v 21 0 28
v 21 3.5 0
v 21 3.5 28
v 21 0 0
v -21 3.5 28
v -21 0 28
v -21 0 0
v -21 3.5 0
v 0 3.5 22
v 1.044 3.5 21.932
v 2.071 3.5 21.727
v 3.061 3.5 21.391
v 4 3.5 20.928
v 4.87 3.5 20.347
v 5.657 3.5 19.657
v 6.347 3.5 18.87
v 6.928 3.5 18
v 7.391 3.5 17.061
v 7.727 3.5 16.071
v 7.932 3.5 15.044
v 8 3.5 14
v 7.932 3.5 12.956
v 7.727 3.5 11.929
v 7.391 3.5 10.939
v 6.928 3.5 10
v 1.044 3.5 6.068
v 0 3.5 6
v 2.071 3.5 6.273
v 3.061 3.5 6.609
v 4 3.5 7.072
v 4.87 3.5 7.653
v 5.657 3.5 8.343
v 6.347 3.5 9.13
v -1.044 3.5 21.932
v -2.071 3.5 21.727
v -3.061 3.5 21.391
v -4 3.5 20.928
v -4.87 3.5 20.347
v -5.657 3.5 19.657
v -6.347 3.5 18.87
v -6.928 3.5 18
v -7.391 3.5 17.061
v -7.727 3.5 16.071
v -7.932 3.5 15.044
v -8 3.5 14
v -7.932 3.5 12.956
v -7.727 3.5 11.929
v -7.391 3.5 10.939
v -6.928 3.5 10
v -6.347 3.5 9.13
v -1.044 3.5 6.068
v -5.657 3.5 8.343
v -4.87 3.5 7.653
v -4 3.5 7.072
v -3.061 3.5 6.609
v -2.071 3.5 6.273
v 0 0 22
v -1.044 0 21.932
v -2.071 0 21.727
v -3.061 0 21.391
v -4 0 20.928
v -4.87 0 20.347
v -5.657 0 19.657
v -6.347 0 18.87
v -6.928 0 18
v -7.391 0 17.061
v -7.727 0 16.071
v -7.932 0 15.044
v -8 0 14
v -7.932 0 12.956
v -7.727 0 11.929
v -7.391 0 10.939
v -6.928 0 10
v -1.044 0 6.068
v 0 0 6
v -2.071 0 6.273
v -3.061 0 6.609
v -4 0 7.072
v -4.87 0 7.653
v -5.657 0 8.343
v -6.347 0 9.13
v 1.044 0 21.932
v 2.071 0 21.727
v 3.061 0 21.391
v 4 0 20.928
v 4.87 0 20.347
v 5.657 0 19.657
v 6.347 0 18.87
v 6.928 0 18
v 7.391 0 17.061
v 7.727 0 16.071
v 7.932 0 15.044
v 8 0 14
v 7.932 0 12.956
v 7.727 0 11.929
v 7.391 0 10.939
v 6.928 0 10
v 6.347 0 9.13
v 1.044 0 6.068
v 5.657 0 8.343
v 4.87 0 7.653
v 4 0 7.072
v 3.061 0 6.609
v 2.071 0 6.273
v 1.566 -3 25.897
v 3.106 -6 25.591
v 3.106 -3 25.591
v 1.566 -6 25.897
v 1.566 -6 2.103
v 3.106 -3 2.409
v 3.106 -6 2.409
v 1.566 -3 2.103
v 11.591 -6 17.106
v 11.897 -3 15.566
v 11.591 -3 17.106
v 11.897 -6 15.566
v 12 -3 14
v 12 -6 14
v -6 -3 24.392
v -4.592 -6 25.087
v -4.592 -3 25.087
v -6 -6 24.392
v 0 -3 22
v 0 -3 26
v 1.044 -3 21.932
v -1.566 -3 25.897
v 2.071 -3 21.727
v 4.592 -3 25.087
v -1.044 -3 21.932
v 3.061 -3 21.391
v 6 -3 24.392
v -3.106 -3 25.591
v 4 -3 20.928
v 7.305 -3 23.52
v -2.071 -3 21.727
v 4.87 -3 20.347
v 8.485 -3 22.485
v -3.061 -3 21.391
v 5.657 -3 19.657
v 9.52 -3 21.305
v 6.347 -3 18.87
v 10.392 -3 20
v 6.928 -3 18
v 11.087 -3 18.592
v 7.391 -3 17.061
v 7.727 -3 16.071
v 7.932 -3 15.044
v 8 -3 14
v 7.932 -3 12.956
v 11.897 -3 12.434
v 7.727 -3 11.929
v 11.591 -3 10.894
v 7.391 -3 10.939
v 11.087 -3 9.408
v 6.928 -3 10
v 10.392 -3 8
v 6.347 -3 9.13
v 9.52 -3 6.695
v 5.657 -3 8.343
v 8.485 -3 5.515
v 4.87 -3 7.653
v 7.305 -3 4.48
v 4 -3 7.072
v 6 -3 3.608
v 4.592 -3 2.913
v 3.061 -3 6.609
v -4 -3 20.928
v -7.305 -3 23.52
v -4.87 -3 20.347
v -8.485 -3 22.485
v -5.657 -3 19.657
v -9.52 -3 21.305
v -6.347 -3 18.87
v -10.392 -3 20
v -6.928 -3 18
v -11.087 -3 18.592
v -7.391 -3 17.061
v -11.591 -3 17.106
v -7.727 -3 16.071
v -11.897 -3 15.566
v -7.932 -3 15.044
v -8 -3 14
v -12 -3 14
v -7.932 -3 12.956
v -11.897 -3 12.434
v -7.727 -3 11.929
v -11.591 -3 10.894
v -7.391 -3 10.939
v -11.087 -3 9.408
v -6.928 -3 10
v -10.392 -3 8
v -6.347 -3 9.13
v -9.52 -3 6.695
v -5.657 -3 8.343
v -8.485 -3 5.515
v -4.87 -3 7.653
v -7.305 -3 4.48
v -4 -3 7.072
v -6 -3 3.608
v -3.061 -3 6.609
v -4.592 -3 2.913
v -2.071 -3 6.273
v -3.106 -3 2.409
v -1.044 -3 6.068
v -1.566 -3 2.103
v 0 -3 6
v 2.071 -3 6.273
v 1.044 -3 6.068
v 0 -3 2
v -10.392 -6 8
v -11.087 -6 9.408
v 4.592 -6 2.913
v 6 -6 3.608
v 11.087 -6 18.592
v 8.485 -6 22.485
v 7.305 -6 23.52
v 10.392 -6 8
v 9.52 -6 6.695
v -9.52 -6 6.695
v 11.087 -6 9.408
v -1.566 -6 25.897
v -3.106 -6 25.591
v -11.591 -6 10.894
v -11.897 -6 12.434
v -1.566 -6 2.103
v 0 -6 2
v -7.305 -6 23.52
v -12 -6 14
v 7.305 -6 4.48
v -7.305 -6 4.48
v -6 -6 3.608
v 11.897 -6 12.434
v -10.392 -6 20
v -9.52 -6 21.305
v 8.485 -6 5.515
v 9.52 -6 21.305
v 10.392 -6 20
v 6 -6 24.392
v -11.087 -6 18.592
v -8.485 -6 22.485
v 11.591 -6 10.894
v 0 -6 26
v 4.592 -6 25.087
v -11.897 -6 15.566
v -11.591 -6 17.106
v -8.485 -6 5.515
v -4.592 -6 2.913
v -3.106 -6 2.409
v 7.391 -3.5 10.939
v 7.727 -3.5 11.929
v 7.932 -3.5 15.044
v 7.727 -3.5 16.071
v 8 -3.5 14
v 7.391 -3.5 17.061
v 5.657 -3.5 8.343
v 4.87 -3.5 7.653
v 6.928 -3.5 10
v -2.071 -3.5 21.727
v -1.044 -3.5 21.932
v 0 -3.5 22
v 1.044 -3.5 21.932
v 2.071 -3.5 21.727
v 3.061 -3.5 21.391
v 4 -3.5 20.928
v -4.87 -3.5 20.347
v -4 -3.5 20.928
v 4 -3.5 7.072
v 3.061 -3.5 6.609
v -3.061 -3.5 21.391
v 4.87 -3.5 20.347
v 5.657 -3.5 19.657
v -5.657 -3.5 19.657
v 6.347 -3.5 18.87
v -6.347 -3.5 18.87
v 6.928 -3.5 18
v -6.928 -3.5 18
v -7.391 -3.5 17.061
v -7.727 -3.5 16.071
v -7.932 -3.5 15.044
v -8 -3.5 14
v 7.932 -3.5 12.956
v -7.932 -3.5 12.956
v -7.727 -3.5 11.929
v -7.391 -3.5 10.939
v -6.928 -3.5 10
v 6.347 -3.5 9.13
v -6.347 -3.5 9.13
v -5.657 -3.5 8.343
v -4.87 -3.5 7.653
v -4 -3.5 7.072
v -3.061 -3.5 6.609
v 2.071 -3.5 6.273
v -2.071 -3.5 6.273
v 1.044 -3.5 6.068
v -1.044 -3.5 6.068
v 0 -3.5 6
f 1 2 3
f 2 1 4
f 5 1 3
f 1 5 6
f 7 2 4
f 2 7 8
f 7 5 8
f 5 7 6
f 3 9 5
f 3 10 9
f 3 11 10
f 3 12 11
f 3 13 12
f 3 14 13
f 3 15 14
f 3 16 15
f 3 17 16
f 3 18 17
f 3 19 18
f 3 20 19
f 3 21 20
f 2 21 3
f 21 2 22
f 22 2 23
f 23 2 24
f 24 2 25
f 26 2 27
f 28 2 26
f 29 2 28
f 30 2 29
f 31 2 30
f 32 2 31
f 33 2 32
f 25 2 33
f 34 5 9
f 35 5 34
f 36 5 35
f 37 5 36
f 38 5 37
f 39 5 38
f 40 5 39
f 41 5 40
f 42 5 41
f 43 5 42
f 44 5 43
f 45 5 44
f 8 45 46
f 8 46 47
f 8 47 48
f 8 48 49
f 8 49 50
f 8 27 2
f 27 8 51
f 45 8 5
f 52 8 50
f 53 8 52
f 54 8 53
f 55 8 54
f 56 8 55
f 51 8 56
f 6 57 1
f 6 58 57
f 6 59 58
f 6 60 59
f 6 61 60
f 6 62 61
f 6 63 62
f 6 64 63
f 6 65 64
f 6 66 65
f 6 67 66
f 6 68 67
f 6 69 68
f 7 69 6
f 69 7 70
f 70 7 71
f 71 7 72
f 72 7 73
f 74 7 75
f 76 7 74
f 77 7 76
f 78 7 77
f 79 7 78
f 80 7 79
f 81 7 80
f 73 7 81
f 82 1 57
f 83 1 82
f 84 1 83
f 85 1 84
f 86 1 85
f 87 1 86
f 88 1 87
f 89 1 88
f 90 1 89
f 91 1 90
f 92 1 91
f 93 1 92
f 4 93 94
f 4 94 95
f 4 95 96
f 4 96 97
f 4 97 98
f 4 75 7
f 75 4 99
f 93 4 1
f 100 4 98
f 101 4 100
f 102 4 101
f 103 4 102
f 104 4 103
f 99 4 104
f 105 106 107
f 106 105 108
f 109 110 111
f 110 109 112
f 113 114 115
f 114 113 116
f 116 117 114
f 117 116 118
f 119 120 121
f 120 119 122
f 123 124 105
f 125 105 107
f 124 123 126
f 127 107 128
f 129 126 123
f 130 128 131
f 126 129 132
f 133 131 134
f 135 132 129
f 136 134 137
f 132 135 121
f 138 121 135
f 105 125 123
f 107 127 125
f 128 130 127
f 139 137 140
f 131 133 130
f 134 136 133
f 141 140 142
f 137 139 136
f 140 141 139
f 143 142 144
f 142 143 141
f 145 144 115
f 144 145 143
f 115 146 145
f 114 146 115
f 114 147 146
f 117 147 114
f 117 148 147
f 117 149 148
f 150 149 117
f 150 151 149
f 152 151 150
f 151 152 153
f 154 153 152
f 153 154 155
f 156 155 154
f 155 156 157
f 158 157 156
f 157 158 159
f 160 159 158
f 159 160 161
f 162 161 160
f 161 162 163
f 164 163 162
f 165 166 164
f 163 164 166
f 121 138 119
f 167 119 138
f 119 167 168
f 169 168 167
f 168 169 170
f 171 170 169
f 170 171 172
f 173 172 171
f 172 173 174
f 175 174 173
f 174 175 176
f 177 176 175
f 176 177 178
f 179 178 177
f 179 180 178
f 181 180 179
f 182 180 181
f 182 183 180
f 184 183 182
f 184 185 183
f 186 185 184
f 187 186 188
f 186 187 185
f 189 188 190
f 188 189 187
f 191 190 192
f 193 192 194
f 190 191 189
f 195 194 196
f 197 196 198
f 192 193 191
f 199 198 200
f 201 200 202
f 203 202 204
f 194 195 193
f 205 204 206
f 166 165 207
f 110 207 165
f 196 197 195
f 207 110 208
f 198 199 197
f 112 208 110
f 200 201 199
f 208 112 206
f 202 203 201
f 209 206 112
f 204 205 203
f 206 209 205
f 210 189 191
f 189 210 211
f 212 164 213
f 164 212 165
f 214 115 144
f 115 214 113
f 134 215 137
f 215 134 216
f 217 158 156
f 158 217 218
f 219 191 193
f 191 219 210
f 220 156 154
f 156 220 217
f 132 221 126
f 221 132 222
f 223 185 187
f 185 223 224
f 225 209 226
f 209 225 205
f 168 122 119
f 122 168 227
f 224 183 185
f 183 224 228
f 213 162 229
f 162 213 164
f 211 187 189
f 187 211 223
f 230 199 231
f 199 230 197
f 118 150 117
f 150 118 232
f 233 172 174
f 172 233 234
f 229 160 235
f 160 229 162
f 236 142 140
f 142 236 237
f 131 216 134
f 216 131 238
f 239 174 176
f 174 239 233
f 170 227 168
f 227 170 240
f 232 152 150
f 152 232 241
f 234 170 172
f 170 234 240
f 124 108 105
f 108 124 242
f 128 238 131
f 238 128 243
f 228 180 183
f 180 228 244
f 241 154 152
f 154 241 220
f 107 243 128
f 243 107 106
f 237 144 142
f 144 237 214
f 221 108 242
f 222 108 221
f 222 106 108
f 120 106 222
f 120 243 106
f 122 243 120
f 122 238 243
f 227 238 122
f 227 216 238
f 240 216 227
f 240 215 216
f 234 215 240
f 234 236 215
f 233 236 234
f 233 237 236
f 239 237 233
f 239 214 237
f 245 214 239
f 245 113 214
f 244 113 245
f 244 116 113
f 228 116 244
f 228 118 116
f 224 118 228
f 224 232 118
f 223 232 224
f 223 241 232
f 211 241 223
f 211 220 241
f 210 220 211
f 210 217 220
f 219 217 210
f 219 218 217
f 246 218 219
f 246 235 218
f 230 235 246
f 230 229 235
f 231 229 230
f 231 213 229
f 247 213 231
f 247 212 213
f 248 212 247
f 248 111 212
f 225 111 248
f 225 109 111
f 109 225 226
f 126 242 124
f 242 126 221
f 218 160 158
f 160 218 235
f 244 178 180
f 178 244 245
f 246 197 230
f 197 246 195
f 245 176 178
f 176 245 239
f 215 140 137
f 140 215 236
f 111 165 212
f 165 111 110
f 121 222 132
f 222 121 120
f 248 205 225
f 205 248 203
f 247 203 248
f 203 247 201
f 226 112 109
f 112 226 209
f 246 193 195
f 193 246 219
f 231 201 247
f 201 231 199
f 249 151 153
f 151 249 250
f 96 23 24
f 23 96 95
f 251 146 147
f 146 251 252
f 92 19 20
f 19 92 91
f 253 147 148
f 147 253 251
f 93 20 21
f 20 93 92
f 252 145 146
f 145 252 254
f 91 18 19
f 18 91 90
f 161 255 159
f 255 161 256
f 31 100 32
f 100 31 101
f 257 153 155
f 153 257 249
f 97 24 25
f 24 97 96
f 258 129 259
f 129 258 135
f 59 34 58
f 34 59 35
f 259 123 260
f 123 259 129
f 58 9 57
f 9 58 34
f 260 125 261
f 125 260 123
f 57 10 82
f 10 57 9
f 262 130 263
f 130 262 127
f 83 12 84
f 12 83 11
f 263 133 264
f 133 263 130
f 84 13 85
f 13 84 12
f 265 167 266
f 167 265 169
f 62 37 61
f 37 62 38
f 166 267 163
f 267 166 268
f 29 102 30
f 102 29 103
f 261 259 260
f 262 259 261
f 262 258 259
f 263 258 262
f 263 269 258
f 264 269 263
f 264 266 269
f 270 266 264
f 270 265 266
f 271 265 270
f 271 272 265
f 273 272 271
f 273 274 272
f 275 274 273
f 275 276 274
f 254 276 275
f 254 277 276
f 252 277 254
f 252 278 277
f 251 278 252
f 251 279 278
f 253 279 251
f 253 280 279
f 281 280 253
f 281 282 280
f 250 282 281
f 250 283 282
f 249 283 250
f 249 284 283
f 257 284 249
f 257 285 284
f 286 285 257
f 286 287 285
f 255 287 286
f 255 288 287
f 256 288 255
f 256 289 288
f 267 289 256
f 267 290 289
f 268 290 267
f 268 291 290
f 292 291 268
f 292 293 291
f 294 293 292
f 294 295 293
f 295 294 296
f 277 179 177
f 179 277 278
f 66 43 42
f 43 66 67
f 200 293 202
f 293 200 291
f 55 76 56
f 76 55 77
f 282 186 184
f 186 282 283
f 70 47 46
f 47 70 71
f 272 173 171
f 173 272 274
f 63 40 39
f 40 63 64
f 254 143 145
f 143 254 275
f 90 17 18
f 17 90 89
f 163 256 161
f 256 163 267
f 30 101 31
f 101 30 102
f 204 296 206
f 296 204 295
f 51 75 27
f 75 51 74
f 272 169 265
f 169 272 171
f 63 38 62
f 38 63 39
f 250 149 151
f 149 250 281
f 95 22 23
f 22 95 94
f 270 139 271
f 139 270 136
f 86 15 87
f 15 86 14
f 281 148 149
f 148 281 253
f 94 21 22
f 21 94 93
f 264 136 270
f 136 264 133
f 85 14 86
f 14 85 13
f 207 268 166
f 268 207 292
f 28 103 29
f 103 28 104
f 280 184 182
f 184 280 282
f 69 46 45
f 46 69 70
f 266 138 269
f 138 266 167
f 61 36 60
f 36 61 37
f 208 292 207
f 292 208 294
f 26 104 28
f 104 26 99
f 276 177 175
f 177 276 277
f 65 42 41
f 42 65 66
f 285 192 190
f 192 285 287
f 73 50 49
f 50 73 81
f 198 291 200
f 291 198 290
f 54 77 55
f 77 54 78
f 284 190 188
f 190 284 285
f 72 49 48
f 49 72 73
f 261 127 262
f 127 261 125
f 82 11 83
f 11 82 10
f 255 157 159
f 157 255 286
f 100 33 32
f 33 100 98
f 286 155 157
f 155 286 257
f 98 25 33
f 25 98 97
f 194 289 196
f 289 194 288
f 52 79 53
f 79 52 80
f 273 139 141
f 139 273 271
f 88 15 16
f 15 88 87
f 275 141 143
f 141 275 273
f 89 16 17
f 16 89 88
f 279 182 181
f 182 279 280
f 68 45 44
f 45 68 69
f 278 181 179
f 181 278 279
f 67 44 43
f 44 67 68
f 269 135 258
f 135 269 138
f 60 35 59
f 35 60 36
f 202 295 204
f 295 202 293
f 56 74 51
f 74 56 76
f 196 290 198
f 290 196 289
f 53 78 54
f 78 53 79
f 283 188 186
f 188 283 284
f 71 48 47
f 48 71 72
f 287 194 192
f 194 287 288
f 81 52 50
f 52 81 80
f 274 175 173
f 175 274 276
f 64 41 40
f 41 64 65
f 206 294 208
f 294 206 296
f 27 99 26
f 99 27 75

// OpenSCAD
// Reusable circular grommet or cable-gland entry in a wall.

$fn = 48;

wall_width = 42.0;
wall_height = 28.0;
wall_thickness = 3.5;
hole_diameter = 16.0;
boss_outer_diameter = 24.0;
boss_thickness = 3.0;
show_example = true;

module grommet_entry_wall() {
    difference() {
        union() {
            translate([-wall_width / 2, 0, 0])
                cube([wall_width, wall_thickness, wall_height]);

            translate([0, -boss_thickness, wall_height / 2])
                rotate([90, 0, 0])
                    cylinder(h = boss_thickness, d = boss_outer_diameter);
        }

        translate([0, wall_thickness / 2, wall_height / 2])
            rotate([90, 0, 0])
                cylinder(h = wall_thickness + 2 * boss_thickness + 1, d = hole_diameter, center = true);
    }
}

if (show_example)
    grommet_entry_wall();
